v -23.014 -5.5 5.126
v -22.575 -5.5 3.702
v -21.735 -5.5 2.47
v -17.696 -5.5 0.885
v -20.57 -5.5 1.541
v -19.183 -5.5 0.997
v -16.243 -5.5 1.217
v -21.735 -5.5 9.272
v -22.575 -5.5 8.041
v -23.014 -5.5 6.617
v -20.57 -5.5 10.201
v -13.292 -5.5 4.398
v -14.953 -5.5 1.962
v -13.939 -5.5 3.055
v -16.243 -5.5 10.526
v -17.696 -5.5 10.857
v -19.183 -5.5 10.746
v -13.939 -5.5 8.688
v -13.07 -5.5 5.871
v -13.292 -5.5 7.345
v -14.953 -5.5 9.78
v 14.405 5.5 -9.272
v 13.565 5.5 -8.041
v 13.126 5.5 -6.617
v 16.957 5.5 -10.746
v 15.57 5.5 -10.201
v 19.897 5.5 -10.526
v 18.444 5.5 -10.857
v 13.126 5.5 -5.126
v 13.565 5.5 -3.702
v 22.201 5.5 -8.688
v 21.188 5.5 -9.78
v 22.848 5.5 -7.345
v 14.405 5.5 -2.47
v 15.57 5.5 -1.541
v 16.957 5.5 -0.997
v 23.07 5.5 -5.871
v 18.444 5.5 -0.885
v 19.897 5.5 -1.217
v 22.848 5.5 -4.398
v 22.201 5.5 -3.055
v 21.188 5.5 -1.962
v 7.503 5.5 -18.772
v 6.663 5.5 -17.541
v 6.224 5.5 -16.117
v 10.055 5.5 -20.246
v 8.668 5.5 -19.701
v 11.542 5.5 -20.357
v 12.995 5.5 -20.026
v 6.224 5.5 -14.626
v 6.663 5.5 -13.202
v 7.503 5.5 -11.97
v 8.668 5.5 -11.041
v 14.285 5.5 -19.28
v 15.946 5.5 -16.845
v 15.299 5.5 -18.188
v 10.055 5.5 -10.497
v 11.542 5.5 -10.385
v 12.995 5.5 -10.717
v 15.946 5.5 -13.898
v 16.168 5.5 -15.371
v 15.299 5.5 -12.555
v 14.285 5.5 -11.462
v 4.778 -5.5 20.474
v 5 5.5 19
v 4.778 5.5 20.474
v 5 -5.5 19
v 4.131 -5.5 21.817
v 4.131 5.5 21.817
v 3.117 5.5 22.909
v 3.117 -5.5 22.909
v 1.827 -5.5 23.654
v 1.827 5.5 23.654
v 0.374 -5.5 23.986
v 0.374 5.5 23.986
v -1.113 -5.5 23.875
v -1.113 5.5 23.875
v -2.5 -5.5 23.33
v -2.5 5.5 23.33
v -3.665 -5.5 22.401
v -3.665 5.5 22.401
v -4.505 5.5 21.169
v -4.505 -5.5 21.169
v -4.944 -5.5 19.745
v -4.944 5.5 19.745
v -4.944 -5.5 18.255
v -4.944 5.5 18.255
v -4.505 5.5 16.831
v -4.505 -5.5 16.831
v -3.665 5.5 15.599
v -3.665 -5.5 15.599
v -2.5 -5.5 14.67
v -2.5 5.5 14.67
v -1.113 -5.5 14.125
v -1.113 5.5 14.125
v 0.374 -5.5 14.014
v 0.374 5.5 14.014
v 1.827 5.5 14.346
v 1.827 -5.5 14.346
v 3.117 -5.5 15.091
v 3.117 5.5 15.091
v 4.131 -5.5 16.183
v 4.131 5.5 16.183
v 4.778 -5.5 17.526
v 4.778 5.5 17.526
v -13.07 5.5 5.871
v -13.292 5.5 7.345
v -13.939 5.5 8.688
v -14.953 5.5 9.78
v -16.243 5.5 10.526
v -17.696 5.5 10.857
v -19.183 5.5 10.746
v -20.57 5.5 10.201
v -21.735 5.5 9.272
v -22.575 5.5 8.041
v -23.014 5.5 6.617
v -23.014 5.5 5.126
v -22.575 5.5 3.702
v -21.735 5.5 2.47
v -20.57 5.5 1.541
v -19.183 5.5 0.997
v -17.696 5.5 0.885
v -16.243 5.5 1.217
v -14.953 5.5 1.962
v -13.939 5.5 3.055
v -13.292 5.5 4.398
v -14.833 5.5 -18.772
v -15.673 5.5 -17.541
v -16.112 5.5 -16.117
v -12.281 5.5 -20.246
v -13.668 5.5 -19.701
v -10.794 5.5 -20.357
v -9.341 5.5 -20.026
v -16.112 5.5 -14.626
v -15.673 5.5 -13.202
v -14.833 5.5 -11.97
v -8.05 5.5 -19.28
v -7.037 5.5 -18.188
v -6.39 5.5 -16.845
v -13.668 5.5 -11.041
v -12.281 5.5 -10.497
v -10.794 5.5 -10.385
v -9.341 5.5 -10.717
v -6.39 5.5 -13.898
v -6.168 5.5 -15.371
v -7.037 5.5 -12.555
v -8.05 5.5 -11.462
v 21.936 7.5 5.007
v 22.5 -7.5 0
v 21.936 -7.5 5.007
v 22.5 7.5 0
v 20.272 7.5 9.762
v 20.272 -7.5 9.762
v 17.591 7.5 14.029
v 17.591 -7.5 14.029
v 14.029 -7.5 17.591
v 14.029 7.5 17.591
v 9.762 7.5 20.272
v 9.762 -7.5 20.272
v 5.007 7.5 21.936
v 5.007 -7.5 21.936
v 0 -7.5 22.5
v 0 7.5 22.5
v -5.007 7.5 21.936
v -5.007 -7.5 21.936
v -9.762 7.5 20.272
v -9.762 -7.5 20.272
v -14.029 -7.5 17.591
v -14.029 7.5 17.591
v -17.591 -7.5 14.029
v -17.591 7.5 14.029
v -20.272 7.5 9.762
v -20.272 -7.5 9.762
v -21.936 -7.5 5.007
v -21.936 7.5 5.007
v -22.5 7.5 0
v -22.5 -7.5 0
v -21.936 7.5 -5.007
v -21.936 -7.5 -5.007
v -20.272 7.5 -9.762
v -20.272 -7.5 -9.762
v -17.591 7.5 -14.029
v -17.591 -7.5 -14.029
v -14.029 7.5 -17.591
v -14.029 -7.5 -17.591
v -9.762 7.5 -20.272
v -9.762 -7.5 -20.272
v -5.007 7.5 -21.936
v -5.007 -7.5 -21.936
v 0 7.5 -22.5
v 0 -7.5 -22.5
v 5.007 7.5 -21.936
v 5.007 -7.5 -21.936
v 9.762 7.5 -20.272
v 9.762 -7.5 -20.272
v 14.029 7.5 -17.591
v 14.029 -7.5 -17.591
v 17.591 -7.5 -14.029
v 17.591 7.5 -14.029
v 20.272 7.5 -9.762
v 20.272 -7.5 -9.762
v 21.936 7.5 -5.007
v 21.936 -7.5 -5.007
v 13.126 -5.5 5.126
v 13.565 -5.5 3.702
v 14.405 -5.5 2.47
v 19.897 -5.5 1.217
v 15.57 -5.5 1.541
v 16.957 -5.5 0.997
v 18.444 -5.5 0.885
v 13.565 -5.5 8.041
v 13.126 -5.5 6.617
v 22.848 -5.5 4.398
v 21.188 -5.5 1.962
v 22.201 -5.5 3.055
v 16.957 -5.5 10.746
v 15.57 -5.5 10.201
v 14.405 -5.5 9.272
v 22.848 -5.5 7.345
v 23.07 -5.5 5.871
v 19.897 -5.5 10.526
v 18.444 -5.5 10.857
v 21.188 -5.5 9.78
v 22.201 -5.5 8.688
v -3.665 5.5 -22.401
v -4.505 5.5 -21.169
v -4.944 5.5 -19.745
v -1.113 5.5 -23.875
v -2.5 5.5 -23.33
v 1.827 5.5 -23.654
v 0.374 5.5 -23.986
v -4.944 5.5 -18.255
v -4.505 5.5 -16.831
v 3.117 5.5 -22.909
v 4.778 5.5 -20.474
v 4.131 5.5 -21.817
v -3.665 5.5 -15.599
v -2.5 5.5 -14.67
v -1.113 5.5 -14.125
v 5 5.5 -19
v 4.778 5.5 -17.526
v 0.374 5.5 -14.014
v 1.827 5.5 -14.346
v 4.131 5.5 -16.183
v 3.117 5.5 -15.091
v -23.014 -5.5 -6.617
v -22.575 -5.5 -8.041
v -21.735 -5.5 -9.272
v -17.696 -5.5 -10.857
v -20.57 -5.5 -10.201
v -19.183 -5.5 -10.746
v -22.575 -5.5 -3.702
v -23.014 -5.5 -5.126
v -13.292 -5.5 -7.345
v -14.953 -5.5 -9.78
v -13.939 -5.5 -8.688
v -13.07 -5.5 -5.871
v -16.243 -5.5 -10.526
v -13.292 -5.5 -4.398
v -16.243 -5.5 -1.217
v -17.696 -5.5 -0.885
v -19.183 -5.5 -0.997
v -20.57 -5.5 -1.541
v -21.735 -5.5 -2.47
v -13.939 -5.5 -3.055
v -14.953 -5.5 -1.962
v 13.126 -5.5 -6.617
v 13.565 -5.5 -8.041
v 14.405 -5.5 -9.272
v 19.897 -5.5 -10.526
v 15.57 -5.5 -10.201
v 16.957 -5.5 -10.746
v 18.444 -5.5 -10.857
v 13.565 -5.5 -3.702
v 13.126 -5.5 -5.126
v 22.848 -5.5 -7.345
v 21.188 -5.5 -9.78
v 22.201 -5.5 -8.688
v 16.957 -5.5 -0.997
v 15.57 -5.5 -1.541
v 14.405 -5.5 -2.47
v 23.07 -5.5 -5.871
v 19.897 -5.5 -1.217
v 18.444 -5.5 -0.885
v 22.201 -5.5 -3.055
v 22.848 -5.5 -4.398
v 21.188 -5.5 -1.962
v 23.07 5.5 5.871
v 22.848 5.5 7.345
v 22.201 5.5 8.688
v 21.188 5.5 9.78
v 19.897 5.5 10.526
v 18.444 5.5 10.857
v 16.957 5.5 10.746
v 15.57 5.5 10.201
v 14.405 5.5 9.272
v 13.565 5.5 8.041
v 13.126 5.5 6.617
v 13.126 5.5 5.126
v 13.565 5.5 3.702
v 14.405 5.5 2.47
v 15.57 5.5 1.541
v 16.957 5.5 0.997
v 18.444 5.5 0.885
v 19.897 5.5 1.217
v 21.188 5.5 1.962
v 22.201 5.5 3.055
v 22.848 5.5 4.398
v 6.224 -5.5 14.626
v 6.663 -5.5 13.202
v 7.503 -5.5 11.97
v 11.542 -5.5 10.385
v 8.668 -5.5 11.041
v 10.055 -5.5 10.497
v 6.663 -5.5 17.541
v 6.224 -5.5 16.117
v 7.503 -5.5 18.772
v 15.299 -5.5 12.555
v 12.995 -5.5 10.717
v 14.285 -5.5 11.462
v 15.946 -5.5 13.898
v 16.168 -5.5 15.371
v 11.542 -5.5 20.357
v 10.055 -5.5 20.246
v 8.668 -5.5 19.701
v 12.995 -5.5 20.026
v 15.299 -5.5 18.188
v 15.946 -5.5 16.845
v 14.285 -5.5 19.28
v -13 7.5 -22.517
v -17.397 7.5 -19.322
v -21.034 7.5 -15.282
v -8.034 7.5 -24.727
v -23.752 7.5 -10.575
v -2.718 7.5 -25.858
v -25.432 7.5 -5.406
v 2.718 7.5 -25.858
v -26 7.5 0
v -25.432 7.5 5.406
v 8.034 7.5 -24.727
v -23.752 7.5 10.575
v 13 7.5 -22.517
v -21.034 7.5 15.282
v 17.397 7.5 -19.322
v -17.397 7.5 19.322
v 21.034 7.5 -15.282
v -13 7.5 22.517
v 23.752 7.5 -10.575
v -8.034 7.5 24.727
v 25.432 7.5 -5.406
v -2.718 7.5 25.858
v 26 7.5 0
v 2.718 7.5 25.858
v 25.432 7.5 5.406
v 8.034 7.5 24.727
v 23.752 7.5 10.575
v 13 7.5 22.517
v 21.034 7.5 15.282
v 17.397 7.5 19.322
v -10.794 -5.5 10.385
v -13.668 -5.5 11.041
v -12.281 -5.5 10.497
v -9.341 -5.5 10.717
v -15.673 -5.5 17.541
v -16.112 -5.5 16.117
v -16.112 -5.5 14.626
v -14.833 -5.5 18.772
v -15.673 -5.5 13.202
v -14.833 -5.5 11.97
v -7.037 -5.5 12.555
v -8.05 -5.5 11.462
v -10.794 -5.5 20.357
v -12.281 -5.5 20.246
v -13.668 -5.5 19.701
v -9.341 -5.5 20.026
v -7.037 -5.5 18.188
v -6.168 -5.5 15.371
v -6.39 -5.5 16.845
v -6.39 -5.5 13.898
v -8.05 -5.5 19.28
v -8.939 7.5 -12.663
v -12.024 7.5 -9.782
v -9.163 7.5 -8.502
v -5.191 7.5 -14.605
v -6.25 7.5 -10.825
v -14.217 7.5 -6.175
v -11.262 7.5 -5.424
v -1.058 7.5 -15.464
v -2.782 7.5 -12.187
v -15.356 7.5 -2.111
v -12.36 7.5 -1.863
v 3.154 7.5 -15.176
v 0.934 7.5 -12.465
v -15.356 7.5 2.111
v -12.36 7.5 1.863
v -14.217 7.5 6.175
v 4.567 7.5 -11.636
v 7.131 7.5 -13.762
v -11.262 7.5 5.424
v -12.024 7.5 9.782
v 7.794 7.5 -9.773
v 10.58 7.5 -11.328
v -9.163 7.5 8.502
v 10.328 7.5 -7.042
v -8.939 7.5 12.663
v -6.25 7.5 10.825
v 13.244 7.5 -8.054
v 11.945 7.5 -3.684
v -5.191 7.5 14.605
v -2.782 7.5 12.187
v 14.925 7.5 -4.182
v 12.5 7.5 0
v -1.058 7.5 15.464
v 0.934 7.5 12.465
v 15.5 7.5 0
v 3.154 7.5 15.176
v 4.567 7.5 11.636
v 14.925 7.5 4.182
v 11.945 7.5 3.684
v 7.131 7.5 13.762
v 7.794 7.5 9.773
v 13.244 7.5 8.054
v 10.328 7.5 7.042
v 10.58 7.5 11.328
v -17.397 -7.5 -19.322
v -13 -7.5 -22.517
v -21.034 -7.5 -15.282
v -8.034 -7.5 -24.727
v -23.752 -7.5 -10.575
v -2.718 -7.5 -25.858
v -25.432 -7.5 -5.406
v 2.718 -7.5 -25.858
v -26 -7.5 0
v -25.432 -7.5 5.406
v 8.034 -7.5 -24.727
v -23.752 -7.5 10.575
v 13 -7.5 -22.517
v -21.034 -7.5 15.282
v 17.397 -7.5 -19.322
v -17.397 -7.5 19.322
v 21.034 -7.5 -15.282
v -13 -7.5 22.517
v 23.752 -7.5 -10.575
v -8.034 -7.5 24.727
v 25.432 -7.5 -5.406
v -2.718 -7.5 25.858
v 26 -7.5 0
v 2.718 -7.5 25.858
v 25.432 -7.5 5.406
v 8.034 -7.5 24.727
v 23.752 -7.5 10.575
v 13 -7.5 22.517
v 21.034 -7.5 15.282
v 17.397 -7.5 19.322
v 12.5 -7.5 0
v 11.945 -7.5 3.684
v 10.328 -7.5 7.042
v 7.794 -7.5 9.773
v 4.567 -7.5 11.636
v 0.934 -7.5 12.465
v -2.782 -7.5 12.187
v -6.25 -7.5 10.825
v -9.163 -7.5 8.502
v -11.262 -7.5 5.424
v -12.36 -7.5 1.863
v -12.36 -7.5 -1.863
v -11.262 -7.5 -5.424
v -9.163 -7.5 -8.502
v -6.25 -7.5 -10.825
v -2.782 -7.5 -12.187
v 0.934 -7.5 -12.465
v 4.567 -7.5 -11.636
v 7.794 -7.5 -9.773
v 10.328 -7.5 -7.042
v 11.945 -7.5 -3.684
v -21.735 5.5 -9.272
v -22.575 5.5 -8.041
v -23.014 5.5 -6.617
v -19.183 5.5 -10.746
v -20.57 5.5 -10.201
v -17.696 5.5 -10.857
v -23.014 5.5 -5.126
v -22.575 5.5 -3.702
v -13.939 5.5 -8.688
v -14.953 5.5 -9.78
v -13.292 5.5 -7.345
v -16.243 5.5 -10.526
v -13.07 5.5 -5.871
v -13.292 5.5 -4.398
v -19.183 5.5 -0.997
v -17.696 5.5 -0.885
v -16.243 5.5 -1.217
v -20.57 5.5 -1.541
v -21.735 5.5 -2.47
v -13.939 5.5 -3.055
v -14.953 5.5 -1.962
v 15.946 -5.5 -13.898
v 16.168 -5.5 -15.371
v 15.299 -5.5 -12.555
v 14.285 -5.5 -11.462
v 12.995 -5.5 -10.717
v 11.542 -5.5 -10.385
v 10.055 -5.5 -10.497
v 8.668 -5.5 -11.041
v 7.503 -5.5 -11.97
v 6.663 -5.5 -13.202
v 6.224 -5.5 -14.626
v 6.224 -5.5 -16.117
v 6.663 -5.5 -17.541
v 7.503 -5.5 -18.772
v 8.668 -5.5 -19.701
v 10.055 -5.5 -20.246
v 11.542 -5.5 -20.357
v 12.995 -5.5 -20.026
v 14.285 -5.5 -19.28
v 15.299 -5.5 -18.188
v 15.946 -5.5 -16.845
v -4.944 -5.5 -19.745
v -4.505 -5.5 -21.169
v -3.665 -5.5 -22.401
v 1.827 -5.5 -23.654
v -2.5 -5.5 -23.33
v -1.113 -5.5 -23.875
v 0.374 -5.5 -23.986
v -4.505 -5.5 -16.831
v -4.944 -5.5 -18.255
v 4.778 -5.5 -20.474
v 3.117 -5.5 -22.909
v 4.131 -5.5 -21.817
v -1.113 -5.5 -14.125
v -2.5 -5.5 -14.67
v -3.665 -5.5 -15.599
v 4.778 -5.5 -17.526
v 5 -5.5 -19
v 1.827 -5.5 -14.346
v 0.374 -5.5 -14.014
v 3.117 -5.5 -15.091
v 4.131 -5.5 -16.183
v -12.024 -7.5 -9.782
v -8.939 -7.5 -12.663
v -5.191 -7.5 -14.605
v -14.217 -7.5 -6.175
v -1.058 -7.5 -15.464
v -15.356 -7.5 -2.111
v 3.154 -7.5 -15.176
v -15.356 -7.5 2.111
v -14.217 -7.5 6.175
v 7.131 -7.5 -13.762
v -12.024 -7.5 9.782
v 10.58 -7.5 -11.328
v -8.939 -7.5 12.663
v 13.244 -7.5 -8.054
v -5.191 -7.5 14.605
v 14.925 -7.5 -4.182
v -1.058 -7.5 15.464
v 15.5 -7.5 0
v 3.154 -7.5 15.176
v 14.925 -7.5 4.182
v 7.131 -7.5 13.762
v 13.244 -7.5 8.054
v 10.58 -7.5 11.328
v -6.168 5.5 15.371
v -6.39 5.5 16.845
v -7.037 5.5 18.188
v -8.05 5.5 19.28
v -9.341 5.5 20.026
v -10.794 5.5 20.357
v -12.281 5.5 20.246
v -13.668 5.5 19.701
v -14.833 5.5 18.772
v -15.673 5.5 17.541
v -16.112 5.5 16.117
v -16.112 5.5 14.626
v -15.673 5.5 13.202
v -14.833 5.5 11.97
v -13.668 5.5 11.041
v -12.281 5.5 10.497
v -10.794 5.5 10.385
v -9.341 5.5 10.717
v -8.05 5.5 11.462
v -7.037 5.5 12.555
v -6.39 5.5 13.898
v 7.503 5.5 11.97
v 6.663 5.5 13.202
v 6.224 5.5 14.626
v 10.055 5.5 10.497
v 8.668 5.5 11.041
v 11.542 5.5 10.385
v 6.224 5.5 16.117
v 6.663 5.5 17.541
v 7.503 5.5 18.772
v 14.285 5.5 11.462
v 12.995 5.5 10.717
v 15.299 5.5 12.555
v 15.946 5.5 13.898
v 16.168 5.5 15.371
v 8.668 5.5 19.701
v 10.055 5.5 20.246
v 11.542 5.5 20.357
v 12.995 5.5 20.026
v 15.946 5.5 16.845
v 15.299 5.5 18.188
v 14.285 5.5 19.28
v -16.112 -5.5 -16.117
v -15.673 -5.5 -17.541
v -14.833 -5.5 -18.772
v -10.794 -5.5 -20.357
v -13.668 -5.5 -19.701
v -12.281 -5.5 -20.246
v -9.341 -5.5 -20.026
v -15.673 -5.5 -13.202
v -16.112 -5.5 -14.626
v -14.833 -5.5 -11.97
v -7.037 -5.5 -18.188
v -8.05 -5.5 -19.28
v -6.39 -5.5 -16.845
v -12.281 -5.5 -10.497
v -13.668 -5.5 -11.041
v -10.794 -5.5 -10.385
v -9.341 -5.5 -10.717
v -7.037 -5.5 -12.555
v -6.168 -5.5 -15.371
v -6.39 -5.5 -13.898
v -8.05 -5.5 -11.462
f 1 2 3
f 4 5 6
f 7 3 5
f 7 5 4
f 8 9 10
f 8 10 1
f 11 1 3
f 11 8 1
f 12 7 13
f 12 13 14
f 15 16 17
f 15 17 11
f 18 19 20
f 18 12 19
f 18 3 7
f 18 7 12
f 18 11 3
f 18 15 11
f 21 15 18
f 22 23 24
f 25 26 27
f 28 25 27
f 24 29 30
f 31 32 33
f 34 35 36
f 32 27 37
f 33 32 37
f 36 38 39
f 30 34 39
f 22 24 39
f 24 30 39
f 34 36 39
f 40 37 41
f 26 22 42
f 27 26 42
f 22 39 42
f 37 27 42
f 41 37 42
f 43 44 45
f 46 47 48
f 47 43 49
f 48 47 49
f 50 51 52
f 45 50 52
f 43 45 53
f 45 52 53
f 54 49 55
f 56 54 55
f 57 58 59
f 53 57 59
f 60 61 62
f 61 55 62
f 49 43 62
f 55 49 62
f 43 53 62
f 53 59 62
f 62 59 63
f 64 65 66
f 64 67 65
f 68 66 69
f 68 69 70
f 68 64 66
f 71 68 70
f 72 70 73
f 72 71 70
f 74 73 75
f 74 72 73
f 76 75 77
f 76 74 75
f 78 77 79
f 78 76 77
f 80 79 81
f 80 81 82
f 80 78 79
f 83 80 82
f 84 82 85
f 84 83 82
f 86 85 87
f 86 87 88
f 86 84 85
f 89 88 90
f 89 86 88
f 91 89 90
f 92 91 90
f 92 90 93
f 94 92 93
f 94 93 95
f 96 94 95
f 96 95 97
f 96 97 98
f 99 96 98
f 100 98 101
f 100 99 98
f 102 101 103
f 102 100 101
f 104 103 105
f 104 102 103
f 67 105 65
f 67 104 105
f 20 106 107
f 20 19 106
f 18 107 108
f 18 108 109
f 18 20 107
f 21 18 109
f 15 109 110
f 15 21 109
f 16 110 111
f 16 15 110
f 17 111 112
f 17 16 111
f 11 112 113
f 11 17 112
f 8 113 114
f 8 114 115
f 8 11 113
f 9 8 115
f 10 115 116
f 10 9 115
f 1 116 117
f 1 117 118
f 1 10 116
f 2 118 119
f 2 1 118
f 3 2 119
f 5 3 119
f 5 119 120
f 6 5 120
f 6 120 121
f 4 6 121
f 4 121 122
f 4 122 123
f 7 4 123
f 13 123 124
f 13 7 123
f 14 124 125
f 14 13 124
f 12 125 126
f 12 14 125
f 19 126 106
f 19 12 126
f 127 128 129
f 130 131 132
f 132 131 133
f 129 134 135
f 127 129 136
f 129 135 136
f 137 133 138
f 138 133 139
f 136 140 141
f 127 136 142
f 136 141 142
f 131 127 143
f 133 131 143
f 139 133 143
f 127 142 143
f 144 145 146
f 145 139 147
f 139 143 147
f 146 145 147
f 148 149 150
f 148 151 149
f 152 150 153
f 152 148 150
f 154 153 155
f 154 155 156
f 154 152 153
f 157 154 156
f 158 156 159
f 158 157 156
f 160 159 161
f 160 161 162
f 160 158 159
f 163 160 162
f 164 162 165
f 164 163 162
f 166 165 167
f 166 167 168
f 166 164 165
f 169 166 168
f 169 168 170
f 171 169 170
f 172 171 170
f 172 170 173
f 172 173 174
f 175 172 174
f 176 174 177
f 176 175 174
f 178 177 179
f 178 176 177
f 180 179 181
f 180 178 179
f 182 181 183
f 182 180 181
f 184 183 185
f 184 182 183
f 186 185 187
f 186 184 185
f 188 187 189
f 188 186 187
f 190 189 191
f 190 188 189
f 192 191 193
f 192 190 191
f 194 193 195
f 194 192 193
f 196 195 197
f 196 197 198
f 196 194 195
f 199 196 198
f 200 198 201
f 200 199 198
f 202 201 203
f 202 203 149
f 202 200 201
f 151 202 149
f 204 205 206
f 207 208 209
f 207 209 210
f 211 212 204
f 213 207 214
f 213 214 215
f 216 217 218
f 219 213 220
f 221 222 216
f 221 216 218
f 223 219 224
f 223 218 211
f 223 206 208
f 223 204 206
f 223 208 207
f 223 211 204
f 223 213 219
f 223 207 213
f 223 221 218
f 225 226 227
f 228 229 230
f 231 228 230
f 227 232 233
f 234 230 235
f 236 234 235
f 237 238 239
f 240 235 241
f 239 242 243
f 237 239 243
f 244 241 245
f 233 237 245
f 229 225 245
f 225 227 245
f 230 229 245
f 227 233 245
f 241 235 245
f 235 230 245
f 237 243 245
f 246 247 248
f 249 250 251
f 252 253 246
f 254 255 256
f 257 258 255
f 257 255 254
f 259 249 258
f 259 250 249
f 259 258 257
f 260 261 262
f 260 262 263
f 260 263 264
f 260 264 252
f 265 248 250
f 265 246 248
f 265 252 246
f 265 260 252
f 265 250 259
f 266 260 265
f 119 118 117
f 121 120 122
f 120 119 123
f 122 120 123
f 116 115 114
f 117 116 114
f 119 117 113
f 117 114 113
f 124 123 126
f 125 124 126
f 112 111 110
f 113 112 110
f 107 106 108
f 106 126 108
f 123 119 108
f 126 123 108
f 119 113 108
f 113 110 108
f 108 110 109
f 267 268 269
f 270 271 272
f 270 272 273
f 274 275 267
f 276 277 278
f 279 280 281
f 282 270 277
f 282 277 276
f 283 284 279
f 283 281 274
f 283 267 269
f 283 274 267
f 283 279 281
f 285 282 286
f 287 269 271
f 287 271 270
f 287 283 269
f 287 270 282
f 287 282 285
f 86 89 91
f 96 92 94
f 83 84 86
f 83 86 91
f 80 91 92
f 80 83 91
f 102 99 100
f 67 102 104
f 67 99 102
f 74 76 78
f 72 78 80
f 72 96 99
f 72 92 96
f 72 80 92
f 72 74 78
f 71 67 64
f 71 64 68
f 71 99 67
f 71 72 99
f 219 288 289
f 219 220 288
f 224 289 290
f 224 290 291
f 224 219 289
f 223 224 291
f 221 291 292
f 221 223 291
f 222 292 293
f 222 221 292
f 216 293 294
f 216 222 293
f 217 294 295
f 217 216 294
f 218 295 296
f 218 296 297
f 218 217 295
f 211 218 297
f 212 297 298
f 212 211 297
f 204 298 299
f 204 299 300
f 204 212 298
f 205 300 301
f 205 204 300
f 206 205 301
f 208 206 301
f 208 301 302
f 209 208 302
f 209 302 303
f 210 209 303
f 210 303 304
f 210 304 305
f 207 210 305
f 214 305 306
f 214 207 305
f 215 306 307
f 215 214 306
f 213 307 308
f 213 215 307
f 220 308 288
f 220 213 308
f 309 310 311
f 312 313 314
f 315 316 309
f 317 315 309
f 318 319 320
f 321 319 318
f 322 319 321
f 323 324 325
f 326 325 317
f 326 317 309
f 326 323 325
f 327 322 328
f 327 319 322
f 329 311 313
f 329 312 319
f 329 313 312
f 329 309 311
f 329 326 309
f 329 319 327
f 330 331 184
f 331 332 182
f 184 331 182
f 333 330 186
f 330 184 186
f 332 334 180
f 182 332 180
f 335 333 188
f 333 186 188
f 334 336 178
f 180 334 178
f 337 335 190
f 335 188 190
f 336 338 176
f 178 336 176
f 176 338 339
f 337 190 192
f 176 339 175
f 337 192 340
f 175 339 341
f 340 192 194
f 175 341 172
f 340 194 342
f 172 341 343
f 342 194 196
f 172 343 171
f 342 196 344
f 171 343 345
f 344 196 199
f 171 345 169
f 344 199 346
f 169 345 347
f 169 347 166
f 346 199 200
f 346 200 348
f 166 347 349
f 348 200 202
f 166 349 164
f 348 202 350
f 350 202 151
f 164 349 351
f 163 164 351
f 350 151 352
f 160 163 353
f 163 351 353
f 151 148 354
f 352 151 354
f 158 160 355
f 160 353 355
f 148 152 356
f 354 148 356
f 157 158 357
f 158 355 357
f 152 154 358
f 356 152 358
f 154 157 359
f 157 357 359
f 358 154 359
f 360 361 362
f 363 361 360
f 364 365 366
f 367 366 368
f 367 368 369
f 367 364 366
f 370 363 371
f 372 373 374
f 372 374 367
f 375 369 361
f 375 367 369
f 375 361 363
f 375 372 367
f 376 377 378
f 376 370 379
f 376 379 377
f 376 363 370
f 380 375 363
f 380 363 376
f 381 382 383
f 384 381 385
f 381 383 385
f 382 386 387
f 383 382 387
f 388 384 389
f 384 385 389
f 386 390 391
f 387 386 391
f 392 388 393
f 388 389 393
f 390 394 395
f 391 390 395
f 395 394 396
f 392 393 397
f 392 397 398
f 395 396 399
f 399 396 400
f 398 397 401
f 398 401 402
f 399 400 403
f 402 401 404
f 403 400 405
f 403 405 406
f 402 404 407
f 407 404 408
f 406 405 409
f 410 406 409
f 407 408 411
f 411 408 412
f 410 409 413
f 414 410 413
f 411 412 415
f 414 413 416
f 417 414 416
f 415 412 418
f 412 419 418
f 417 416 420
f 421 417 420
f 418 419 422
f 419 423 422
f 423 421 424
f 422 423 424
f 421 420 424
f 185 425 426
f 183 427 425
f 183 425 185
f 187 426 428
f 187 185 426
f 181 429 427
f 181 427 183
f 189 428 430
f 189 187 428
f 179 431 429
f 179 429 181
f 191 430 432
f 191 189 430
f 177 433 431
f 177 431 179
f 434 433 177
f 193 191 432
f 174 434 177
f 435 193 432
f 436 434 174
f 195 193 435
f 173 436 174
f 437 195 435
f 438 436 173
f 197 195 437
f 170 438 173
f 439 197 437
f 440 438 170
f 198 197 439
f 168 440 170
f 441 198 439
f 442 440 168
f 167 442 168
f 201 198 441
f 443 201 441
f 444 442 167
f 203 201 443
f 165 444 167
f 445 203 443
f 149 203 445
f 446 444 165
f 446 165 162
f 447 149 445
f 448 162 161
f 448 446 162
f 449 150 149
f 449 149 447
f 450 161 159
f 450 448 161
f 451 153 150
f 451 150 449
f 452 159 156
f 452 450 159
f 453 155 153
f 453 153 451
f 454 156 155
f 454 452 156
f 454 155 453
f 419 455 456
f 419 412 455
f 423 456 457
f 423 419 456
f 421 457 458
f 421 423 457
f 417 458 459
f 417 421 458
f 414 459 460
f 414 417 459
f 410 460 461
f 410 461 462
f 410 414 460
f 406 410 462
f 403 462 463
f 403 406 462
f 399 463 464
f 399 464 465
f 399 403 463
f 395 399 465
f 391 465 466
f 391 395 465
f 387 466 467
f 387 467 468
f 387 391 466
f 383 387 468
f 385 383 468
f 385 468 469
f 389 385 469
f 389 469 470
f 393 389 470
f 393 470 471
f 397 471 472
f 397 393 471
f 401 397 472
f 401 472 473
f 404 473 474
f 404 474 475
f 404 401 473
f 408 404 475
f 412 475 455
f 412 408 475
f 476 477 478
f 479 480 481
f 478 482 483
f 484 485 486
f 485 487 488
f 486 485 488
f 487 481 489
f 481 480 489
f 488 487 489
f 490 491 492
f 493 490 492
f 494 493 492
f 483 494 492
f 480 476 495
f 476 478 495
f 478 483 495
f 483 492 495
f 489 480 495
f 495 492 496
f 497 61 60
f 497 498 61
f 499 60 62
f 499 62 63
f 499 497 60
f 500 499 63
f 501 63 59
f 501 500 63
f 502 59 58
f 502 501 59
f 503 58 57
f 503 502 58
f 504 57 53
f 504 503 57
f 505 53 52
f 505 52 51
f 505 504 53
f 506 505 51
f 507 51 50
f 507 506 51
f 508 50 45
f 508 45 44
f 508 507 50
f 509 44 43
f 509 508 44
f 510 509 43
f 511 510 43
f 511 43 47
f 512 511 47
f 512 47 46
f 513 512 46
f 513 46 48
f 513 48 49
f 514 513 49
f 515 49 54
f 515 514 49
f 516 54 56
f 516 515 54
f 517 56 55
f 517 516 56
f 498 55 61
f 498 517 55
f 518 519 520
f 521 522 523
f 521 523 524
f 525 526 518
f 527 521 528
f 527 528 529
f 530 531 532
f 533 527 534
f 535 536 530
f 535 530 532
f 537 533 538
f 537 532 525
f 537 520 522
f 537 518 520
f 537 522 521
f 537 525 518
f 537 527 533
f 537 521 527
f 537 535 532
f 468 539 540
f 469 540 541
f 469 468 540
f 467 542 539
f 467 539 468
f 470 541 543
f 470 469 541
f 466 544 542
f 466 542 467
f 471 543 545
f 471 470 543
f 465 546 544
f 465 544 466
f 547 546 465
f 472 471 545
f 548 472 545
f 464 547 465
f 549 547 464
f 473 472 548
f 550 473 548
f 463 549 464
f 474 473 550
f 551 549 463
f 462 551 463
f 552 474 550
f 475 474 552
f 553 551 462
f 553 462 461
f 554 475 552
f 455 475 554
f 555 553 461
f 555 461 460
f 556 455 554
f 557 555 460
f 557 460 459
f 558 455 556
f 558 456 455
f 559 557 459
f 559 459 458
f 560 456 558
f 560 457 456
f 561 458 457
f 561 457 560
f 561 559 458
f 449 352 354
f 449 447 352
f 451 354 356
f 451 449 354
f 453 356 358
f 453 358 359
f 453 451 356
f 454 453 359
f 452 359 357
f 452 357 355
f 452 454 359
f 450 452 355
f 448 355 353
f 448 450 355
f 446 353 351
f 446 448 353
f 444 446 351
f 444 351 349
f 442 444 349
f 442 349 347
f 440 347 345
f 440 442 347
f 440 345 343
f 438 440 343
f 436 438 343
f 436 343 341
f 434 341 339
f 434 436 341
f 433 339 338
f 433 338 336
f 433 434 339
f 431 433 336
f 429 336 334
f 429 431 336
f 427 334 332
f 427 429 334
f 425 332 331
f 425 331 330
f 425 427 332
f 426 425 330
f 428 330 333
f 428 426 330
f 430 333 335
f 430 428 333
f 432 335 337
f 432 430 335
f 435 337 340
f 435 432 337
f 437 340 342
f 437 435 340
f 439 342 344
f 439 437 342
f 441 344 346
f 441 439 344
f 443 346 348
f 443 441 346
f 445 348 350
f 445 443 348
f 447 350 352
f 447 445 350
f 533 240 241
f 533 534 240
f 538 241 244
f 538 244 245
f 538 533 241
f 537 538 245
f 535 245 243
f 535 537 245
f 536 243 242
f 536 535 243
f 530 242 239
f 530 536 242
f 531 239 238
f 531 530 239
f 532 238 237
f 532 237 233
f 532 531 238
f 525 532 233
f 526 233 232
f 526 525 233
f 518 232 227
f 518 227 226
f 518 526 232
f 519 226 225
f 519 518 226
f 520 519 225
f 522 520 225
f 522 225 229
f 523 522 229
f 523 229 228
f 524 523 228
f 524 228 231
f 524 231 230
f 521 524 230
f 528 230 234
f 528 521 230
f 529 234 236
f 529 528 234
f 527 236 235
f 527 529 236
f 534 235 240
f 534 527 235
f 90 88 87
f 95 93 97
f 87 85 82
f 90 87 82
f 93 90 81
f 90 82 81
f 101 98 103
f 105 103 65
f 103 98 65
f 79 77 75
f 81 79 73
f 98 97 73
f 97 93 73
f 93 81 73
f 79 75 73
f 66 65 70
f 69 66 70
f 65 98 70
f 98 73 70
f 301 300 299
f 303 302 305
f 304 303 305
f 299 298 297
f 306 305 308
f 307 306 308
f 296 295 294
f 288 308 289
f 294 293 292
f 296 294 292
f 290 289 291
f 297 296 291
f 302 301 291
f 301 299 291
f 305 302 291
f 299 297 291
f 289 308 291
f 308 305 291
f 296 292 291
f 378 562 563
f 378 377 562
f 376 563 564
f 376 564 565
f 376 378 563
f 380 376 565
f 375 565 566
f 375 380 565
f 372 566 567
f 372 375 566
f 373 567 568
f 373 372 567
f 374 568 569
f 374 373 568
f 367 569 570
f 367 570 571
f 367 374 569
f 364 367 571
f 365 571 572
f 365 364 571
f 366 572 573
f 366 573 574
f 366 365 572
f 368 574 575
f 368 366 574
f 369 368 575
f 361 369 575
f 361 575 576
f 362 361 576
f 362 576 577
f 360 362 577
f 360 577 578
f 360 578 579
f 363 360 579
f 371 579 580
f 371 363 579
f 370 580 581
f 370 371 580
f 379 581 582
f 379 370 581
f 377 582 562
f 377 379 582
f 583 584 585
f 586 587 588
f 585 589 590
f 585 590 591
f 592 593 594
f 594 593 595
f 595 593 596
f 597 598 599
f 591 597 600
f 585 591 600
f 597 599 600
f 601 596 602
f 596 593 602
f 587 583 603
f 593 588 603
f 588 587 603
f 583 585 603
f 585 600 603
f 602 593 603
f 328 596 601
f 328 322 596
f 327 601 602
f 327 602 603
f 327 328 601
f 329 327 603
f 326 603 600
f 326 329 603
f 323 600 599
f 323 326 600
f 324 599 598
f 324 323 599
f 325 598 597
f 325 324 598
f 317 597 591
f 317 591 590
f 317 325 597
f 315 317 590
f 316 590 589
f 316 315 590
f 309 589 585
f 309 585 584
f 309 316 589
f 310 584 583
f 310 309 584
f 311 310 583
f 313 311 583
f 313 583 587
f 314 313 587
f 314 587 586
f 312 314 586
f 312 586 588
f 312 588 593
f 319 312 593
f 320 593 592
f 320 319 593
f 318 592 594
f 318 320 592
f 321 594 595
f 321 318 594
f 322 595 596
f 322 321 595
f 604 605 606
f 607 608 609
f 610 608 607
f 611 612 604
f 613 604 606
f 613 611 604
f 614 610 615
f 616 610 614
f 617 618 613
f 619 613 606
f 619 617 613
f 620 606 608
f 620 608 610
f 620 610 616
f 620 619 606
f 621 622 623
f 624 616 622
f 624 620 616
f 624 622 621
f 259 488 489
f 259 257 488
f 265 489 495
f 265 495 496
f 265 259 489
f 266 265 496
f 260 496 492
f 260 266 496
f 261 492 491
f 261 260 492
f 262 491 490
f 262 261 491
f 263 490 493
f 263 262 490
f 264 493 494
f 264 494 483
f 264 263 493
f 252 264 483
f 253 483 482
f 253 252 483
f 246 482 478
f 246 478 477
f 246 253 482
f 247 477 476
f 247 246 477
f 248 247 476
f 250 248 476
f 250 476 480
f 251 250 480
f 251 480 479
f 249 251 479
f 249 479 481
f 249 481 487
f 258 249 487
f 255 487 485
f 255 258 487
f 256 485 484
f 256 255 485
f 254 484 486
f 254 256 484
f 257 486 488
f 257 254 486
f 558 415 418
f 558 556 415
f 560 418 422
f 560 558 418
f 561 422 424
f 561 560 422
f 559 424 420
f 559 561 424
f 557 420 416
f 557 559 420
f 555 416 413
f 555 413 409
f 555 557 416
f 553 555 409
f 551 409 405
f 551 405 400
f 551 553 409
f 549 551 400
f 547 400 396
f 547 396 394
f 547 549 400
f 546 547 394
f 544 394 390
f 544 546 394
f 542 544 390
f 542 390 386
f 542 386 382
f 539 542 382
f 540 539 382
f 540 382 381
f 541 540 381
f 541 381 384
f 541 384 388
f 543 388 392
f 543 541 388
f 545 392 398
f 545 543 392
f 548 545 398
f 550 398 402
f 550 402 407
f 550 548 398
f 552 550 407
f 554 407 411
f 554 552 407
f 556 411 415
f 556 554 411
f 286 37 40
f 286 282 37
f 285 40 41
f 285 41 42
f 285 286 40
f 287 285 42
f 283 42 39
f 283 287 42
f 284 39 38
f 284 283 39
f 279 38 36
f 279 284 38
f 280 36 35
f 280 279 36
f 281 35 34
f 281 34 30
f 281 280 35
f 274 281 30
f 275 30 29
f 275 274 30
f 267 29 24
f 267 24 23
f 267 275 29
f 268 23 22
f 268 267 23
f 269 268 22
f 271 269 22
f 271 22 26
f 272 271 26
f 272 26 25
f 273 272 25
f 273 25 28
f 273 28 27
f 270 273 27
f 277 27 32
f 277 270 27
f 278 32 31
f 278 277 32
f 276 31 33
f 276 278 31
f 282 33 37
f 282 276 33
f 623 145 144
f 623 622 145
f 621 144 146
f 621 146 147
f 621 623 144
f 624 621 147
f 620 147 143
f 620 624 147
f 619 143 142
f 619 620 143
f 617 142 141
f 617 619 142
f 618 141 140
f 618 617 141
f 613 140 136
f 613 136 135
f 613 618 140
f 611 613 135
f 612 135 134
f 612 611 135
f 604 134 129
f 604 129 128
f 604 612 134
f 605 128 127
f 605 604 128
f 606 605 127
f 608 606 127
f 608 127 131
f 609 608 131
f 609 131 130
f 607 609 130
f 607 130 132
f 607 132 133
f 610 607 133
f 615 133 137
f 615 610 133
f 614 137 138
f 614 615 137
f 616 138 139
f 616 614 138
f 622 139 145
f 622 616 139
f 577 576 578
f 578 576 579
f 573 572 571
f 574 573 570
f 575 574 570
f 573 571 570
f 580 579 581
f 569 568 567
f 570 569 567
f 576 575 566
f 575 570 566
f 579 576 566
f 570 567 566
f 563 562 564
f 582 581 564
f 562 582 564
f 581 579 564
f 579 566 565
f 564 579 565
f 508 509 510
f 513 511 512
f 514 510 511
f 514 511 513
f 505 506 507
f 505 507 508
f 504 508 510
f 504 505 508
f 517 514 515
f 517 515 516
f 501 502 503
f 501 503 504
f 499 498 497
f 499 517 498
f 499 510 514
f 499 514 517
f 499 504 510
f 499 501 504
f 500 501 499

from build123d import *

# Parameters (mm, degrees)
F0_R     = 26
F0_R_2   = 22.5
F1_DEPTH = 7.5
F0_R_3   = 15.5
F0_R_4   = 12.5
F2_R     = 5
F3_DEPTH = 5.5


with BuildPart() as f1:
    # F0 (on Front) → F1 (new body, symmetric)
    with BuildSketch(Plane.XZ):
        Circle(F0_R)
        Circle(F0_R_2, mode=Mode.SUBTRACT)
    extrude(amount=F1_DEPTH, both=True)


with BuildPart() as f1b:
    # F0 (on Front) → F1, piece 2 (new body, symmetric)
    with BuildSketch(Plane.XZ):
        Circle(F0_R_3)
        Circle(F0_R_4, mode=Mode.SUBTRACT)
    extrude(amount=F1_DEPTH, both=True)


with BuildPart() as f3:
    # F2 (on Front) → F3 (new body, symmetric)
    with BuildSketch(Plane.XZ):
        with Locations((0, 19)):
            Circle(F2_R)
    extrude(amount=F3_DEPTH, both=True)


with BuildPart() as f3b:
    # F2 (on Front) → F3, piece 2 (new body, symmetric)
    with BuildSketch(Plane.XZ):
        with Locations((-11.1679197936, 15.3713228931)):
            Circle(F2_R)
    extrude(amount=F3_DEPTH, both=True)


with BuildPart() as f3c:
    # F2 (on Front) → F3, piece 3 (new body, symmetric)
    with BuildSketch(Plane.XZ):
        with Locations((-18.0700738096, 5.8713228931)):
            Circle(F2_R)
    extrude(amount=F3_DEPTH, both=True)


with BuildPart() as f3d:
    # F2 (on Front) → F3, piece 4 (new body, symmetric)
    with BuildSketch(Plane.XZ):
        with Locations((-18.0700738096, -5.8713228931)):
            Circle(F2_R)
    extrude(amount=F3_DEPTH, both=True)


with BuildPart() as f3e:
    # F2 (on Front) → F3, piece 5 (new body, symmetric)
    with BuildSketch(Plane.XZ):
        with Locations((-11.1679197936, -15.3713228931)):
            Circle(F2_R)
    extrude(amount=F3_DEPTH, both=True)


with BuildPart() as f3f:
    # F2 (on Front) → F3, piece 6 (new body, symmetric)
    with BuildSketch(Plane.XZ):
        with Locations((0, -19)):
            Circle(F2_R)
    extrude(amount=F3_DEPTH, both=True)


with BuildPart() as f3g:
    # F2 (on Front) → F3, piece 7 (new body, symmetric)
    with BuildSketch(Plane.XZ):
        with Locations((11.1679197936, -15.3713228931)):
            Circle(F2_R)
    extrude(amount=F3_DEPTH, both=True)


with BuildPart() as f3h:
    # F2 (on Front) → F3, piece 8 (new body, symmetric)
    with BuildSketch(Plane.XZ):
        with Locations((18.0700738096, -5.8713228931)):
            Circle(F2_R)
    extrude(amount=F3_DEPTH, both=True)


with BuildPart() as f3i:
    # F2 (on Front) → F3, piece 9 (new body, symmetric)
    with BuildSketch(Plane.XZ):
        with Locations((18.0700738096, 5.8713228931)):
            Circle(F2_R)
    extrude(amount=F3_DEPTH, both=True)


with BuildPart() as f3j:
    # F2 (on Front) → F3, piece 10 (new body, symmetric)
    with BuildSketch(Plane.XZ):
        with Locations((11.1679197936, 15.3713228931)):
            Circle(F2_R)
    extrude(amount=F3_DEPTH, both=True)


solid = Compound([f1.part, f1b.part, f3.part, f3b.part, f3c.part, f3d.part, f3e.part, f3f.part, f3g.part, f3h.part, f3i.part, f3j.part])
